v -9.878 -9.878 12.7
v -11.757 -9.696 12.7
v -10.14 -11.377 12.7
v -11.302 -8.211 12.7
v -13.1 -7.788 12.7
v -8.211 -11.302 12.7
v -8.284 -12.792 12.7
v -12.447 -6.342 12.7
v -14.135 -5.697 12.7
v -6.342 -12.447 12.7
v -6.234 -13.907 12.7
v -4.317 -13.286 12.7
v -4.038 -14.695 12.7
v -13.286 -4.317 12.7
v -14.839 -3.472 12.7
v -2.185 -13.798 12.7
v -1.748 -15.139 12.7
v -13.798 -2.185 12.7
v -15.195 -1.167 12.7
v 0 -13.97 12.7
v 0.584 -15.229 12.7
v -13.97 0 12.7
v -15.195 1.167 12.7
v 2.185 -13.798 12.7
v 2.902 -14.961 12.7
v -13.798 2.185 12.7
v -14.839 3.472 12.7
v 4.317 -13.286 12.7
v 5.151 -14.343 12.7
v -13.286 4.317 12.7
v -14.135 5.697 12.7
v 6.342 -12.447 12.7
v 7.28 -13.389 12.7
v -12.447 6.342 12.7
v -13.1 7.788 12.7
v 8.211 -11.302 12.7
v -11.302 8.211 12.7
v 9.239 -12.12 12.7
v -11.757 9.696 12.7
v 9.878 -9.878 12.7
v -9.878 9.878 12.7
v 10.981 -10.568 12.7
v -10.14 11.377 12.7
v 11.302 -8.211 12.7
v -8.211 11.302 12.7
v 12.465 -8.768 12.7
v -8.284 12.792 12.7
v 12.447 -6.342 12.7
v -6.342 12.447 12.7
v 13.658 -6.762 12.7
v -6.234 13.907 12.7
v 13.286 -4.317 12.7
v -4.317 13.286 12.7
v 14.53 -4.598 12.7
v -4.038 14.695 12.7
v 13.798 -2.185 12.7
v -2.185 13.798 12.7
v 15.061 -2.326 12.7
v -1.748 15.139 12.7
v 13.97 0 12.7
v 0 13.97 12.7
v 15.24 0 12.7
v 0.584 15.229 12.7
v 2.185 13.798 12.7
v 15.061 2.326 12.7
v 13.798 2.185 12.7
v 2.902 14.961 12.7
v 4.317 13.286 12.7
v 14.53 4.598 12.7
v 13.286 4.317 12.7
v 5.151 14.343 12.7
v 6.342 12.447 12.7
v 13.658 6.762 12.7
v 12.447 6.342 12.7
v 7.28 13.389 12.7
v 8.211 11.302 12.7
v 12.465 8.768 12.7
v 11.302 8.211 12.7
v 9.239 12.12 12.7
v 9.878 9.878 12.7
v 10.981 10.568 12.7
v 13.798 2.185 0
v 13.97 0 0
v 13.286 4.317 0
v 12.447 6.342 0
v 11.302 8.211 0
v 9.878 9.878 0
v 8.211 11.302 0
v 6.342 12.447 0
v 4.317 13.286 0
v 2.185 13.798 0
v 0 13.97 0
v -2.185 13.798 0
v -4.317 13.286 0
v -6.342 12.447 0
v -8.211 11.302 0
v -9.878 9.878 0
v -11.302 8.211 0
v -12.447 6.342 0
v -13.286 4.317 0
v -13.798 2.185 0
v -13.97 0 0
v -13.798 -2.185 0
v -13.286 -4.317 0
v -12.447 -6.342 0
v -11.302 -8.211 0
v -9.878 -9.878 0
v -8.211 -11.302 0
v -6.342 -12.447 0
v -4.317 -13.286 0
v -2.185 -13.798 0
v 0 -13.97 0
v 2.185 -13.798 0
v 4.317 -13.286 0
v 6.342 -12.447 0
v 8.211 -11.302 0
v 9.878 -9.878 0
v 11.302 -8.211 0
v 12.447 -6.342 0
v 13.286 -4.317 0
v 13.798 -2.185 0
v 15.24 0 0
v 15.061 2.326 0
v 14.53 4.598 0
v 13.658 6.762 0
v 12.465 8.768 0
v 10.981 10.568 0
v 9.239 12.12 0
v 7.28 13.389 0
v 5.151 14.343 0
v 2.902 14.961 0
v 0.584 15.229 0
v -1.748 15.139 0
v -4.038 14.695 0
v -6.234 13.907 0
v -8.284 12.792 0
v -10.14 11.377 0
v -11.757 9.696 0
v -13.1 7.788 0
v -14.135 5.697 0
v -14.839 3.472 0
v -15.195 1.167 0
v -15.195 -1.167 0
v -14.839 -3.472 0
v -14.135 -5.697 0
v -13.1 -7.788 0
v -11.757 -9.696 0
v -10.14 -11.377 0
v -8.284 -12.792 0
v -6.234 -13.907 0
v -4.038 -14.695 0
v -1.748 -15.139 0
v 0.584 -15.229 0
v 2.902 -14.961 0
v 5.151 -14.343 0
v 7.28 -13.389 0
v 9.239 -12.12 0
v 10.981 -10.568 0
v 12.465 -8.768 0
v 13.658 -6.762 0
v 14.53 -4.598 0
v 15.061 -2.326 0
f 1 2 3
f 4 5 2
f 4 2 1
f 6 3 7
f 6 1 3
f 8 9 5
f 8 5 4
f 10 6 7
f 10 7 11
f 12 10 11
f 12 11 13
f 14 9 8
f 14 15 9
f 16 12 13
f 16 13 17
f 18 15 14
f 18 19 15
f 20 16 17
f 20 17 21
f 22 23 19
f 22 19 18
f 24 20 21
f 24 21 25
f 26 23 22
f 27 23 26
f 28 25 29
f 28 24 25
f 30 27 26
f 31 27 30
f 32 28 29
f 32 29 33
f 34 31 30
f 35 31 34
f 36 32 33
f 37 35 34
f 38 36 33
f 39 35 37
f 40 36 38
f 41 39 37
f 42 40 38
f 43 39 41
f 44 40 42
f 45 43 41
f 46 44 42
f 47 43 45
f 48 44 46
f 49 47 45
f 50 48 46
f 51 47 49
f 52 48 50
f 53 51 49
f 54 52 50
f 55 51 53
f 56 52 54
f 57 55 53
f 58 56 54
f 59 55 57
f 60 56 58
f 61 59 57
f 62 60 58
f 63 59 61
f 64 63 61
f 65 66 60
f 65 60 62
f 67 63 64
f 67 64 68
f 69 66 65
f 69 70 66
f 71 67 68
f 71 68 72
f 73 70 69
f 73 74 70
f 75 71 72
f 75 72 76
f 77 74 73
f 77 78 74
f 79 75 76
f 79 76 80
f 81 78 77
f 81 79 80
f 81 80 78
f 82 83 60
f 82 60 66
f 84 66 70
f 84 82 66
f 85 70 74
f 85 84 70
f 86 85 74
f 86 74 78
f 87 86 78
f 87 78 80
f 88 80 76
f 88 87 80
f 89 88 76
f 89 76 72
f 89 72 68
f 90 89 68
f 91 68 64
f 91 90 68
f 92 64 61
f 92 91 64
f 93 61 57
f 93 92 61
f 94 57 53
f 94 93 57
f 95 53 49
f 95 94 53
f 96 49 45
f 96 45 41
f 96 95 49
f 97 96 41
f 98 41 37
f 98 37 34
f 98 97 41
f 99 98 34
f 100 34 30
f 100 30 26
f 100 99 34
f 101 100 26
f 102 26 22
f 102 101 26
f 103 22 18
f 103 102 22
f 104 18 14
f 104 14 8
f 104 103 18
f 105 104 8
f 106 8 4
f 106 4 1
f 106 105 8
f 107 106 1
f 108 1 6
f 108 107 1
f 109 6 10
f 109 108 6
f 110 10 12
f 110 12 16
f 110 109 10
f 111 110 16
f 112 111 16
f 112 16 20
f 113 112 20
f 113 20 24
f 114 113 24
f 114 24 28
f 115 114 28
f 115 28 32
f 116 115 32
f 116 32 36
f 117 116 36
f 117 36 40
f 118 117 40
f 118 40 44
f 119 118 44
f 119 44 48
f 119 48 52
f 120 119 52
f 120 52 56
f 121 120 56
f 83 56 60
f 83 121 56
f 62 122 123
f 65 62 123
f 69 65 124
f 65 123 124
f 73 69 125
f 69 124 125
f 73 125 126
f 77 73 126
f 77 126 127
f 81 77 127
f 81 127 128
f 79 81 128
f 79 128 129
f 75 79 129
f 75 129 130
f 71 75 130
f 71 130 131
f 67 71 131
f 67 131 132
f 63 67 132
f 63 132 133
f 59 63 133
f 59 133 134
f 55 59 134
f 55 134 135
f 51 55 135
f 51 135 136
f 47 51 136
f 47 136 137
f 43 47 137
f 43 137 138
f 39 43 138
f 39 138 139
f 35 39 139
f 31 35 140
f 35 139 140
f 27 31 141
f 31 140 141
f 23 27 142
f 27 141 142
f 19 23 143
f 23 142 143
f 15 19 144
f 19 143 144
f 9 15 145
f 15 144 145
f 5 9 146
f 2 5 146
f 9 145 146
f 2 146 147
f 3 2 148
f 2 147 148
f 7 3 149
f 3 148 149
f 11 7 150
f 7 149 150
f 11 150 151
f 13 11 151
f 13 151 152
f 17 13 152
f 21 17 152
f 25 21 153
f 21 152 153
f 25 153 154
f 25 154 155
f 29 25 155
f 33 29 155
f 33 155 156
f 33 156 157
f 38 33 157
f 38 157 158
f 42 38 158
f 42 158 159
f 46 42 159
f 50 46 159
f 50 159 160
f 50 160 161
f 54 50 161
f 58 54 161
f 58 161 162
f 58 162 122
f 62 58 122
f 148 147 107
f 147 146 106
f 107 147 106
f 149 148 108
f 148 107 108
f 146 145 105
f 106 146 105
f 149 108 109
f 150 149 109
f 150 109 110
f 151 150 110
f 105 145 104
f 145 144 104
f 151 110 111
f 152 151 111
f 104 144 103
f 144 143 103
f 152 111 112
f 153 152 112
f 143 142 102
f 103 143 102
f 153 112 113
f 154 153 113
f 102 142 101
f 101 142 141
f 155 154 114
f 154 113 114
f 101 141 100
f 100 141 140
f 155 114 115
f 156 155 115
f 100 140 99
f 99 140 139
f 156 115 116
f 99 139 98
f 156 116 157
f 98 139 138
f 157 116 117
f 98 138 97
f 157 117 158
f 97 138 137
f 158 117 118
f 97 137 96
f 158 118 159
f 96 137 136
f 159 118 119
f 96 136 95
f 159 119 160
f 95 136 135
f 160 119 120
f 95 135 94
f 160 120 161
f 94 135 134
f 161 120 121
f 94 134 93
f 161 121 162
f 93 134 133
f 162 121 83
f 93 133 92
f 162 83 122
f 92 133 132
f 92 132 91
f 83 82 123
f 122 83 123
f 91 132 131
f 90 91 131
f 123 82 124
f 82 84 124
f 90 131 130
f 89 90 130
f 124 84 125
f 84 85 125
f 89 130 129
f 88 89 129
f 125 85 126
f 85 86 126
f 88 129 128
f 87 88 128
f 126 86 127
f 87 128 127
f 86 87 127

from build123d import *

# Parameters (mm, degrees)
F0_R     = 15.24
F1_DEPTH = 12.7
F2_R     = 13.97
F3_DEPTH = 12.7
F4_R     = 13.97
F5_DEPTH = 12.7


with BuildPart() as f1:
    # F0 (on Top) → F1 (new body)
    with BuildSketch(Plane.XY):
        Circle(F0_R)
    extrude(amount=F1_DEPTH)

    # F2 (on Top) → F3 (cut)
    with BuildSketch(Plane.XY):
        with Locations((-10.602972, 18.632865)):
            Circle(F2_R)
    extrude(amount=-F3_DEPTH, mode=Mode.SUBTRACT)

    # F4 (on Top) → F5 (cut)
    with BuildSketch(Plane.XY):
        Circle(F4_R)
    extrude(amount=F5_DEPTH, mode=Mode.SUBTRACT)


solid = f1.part
